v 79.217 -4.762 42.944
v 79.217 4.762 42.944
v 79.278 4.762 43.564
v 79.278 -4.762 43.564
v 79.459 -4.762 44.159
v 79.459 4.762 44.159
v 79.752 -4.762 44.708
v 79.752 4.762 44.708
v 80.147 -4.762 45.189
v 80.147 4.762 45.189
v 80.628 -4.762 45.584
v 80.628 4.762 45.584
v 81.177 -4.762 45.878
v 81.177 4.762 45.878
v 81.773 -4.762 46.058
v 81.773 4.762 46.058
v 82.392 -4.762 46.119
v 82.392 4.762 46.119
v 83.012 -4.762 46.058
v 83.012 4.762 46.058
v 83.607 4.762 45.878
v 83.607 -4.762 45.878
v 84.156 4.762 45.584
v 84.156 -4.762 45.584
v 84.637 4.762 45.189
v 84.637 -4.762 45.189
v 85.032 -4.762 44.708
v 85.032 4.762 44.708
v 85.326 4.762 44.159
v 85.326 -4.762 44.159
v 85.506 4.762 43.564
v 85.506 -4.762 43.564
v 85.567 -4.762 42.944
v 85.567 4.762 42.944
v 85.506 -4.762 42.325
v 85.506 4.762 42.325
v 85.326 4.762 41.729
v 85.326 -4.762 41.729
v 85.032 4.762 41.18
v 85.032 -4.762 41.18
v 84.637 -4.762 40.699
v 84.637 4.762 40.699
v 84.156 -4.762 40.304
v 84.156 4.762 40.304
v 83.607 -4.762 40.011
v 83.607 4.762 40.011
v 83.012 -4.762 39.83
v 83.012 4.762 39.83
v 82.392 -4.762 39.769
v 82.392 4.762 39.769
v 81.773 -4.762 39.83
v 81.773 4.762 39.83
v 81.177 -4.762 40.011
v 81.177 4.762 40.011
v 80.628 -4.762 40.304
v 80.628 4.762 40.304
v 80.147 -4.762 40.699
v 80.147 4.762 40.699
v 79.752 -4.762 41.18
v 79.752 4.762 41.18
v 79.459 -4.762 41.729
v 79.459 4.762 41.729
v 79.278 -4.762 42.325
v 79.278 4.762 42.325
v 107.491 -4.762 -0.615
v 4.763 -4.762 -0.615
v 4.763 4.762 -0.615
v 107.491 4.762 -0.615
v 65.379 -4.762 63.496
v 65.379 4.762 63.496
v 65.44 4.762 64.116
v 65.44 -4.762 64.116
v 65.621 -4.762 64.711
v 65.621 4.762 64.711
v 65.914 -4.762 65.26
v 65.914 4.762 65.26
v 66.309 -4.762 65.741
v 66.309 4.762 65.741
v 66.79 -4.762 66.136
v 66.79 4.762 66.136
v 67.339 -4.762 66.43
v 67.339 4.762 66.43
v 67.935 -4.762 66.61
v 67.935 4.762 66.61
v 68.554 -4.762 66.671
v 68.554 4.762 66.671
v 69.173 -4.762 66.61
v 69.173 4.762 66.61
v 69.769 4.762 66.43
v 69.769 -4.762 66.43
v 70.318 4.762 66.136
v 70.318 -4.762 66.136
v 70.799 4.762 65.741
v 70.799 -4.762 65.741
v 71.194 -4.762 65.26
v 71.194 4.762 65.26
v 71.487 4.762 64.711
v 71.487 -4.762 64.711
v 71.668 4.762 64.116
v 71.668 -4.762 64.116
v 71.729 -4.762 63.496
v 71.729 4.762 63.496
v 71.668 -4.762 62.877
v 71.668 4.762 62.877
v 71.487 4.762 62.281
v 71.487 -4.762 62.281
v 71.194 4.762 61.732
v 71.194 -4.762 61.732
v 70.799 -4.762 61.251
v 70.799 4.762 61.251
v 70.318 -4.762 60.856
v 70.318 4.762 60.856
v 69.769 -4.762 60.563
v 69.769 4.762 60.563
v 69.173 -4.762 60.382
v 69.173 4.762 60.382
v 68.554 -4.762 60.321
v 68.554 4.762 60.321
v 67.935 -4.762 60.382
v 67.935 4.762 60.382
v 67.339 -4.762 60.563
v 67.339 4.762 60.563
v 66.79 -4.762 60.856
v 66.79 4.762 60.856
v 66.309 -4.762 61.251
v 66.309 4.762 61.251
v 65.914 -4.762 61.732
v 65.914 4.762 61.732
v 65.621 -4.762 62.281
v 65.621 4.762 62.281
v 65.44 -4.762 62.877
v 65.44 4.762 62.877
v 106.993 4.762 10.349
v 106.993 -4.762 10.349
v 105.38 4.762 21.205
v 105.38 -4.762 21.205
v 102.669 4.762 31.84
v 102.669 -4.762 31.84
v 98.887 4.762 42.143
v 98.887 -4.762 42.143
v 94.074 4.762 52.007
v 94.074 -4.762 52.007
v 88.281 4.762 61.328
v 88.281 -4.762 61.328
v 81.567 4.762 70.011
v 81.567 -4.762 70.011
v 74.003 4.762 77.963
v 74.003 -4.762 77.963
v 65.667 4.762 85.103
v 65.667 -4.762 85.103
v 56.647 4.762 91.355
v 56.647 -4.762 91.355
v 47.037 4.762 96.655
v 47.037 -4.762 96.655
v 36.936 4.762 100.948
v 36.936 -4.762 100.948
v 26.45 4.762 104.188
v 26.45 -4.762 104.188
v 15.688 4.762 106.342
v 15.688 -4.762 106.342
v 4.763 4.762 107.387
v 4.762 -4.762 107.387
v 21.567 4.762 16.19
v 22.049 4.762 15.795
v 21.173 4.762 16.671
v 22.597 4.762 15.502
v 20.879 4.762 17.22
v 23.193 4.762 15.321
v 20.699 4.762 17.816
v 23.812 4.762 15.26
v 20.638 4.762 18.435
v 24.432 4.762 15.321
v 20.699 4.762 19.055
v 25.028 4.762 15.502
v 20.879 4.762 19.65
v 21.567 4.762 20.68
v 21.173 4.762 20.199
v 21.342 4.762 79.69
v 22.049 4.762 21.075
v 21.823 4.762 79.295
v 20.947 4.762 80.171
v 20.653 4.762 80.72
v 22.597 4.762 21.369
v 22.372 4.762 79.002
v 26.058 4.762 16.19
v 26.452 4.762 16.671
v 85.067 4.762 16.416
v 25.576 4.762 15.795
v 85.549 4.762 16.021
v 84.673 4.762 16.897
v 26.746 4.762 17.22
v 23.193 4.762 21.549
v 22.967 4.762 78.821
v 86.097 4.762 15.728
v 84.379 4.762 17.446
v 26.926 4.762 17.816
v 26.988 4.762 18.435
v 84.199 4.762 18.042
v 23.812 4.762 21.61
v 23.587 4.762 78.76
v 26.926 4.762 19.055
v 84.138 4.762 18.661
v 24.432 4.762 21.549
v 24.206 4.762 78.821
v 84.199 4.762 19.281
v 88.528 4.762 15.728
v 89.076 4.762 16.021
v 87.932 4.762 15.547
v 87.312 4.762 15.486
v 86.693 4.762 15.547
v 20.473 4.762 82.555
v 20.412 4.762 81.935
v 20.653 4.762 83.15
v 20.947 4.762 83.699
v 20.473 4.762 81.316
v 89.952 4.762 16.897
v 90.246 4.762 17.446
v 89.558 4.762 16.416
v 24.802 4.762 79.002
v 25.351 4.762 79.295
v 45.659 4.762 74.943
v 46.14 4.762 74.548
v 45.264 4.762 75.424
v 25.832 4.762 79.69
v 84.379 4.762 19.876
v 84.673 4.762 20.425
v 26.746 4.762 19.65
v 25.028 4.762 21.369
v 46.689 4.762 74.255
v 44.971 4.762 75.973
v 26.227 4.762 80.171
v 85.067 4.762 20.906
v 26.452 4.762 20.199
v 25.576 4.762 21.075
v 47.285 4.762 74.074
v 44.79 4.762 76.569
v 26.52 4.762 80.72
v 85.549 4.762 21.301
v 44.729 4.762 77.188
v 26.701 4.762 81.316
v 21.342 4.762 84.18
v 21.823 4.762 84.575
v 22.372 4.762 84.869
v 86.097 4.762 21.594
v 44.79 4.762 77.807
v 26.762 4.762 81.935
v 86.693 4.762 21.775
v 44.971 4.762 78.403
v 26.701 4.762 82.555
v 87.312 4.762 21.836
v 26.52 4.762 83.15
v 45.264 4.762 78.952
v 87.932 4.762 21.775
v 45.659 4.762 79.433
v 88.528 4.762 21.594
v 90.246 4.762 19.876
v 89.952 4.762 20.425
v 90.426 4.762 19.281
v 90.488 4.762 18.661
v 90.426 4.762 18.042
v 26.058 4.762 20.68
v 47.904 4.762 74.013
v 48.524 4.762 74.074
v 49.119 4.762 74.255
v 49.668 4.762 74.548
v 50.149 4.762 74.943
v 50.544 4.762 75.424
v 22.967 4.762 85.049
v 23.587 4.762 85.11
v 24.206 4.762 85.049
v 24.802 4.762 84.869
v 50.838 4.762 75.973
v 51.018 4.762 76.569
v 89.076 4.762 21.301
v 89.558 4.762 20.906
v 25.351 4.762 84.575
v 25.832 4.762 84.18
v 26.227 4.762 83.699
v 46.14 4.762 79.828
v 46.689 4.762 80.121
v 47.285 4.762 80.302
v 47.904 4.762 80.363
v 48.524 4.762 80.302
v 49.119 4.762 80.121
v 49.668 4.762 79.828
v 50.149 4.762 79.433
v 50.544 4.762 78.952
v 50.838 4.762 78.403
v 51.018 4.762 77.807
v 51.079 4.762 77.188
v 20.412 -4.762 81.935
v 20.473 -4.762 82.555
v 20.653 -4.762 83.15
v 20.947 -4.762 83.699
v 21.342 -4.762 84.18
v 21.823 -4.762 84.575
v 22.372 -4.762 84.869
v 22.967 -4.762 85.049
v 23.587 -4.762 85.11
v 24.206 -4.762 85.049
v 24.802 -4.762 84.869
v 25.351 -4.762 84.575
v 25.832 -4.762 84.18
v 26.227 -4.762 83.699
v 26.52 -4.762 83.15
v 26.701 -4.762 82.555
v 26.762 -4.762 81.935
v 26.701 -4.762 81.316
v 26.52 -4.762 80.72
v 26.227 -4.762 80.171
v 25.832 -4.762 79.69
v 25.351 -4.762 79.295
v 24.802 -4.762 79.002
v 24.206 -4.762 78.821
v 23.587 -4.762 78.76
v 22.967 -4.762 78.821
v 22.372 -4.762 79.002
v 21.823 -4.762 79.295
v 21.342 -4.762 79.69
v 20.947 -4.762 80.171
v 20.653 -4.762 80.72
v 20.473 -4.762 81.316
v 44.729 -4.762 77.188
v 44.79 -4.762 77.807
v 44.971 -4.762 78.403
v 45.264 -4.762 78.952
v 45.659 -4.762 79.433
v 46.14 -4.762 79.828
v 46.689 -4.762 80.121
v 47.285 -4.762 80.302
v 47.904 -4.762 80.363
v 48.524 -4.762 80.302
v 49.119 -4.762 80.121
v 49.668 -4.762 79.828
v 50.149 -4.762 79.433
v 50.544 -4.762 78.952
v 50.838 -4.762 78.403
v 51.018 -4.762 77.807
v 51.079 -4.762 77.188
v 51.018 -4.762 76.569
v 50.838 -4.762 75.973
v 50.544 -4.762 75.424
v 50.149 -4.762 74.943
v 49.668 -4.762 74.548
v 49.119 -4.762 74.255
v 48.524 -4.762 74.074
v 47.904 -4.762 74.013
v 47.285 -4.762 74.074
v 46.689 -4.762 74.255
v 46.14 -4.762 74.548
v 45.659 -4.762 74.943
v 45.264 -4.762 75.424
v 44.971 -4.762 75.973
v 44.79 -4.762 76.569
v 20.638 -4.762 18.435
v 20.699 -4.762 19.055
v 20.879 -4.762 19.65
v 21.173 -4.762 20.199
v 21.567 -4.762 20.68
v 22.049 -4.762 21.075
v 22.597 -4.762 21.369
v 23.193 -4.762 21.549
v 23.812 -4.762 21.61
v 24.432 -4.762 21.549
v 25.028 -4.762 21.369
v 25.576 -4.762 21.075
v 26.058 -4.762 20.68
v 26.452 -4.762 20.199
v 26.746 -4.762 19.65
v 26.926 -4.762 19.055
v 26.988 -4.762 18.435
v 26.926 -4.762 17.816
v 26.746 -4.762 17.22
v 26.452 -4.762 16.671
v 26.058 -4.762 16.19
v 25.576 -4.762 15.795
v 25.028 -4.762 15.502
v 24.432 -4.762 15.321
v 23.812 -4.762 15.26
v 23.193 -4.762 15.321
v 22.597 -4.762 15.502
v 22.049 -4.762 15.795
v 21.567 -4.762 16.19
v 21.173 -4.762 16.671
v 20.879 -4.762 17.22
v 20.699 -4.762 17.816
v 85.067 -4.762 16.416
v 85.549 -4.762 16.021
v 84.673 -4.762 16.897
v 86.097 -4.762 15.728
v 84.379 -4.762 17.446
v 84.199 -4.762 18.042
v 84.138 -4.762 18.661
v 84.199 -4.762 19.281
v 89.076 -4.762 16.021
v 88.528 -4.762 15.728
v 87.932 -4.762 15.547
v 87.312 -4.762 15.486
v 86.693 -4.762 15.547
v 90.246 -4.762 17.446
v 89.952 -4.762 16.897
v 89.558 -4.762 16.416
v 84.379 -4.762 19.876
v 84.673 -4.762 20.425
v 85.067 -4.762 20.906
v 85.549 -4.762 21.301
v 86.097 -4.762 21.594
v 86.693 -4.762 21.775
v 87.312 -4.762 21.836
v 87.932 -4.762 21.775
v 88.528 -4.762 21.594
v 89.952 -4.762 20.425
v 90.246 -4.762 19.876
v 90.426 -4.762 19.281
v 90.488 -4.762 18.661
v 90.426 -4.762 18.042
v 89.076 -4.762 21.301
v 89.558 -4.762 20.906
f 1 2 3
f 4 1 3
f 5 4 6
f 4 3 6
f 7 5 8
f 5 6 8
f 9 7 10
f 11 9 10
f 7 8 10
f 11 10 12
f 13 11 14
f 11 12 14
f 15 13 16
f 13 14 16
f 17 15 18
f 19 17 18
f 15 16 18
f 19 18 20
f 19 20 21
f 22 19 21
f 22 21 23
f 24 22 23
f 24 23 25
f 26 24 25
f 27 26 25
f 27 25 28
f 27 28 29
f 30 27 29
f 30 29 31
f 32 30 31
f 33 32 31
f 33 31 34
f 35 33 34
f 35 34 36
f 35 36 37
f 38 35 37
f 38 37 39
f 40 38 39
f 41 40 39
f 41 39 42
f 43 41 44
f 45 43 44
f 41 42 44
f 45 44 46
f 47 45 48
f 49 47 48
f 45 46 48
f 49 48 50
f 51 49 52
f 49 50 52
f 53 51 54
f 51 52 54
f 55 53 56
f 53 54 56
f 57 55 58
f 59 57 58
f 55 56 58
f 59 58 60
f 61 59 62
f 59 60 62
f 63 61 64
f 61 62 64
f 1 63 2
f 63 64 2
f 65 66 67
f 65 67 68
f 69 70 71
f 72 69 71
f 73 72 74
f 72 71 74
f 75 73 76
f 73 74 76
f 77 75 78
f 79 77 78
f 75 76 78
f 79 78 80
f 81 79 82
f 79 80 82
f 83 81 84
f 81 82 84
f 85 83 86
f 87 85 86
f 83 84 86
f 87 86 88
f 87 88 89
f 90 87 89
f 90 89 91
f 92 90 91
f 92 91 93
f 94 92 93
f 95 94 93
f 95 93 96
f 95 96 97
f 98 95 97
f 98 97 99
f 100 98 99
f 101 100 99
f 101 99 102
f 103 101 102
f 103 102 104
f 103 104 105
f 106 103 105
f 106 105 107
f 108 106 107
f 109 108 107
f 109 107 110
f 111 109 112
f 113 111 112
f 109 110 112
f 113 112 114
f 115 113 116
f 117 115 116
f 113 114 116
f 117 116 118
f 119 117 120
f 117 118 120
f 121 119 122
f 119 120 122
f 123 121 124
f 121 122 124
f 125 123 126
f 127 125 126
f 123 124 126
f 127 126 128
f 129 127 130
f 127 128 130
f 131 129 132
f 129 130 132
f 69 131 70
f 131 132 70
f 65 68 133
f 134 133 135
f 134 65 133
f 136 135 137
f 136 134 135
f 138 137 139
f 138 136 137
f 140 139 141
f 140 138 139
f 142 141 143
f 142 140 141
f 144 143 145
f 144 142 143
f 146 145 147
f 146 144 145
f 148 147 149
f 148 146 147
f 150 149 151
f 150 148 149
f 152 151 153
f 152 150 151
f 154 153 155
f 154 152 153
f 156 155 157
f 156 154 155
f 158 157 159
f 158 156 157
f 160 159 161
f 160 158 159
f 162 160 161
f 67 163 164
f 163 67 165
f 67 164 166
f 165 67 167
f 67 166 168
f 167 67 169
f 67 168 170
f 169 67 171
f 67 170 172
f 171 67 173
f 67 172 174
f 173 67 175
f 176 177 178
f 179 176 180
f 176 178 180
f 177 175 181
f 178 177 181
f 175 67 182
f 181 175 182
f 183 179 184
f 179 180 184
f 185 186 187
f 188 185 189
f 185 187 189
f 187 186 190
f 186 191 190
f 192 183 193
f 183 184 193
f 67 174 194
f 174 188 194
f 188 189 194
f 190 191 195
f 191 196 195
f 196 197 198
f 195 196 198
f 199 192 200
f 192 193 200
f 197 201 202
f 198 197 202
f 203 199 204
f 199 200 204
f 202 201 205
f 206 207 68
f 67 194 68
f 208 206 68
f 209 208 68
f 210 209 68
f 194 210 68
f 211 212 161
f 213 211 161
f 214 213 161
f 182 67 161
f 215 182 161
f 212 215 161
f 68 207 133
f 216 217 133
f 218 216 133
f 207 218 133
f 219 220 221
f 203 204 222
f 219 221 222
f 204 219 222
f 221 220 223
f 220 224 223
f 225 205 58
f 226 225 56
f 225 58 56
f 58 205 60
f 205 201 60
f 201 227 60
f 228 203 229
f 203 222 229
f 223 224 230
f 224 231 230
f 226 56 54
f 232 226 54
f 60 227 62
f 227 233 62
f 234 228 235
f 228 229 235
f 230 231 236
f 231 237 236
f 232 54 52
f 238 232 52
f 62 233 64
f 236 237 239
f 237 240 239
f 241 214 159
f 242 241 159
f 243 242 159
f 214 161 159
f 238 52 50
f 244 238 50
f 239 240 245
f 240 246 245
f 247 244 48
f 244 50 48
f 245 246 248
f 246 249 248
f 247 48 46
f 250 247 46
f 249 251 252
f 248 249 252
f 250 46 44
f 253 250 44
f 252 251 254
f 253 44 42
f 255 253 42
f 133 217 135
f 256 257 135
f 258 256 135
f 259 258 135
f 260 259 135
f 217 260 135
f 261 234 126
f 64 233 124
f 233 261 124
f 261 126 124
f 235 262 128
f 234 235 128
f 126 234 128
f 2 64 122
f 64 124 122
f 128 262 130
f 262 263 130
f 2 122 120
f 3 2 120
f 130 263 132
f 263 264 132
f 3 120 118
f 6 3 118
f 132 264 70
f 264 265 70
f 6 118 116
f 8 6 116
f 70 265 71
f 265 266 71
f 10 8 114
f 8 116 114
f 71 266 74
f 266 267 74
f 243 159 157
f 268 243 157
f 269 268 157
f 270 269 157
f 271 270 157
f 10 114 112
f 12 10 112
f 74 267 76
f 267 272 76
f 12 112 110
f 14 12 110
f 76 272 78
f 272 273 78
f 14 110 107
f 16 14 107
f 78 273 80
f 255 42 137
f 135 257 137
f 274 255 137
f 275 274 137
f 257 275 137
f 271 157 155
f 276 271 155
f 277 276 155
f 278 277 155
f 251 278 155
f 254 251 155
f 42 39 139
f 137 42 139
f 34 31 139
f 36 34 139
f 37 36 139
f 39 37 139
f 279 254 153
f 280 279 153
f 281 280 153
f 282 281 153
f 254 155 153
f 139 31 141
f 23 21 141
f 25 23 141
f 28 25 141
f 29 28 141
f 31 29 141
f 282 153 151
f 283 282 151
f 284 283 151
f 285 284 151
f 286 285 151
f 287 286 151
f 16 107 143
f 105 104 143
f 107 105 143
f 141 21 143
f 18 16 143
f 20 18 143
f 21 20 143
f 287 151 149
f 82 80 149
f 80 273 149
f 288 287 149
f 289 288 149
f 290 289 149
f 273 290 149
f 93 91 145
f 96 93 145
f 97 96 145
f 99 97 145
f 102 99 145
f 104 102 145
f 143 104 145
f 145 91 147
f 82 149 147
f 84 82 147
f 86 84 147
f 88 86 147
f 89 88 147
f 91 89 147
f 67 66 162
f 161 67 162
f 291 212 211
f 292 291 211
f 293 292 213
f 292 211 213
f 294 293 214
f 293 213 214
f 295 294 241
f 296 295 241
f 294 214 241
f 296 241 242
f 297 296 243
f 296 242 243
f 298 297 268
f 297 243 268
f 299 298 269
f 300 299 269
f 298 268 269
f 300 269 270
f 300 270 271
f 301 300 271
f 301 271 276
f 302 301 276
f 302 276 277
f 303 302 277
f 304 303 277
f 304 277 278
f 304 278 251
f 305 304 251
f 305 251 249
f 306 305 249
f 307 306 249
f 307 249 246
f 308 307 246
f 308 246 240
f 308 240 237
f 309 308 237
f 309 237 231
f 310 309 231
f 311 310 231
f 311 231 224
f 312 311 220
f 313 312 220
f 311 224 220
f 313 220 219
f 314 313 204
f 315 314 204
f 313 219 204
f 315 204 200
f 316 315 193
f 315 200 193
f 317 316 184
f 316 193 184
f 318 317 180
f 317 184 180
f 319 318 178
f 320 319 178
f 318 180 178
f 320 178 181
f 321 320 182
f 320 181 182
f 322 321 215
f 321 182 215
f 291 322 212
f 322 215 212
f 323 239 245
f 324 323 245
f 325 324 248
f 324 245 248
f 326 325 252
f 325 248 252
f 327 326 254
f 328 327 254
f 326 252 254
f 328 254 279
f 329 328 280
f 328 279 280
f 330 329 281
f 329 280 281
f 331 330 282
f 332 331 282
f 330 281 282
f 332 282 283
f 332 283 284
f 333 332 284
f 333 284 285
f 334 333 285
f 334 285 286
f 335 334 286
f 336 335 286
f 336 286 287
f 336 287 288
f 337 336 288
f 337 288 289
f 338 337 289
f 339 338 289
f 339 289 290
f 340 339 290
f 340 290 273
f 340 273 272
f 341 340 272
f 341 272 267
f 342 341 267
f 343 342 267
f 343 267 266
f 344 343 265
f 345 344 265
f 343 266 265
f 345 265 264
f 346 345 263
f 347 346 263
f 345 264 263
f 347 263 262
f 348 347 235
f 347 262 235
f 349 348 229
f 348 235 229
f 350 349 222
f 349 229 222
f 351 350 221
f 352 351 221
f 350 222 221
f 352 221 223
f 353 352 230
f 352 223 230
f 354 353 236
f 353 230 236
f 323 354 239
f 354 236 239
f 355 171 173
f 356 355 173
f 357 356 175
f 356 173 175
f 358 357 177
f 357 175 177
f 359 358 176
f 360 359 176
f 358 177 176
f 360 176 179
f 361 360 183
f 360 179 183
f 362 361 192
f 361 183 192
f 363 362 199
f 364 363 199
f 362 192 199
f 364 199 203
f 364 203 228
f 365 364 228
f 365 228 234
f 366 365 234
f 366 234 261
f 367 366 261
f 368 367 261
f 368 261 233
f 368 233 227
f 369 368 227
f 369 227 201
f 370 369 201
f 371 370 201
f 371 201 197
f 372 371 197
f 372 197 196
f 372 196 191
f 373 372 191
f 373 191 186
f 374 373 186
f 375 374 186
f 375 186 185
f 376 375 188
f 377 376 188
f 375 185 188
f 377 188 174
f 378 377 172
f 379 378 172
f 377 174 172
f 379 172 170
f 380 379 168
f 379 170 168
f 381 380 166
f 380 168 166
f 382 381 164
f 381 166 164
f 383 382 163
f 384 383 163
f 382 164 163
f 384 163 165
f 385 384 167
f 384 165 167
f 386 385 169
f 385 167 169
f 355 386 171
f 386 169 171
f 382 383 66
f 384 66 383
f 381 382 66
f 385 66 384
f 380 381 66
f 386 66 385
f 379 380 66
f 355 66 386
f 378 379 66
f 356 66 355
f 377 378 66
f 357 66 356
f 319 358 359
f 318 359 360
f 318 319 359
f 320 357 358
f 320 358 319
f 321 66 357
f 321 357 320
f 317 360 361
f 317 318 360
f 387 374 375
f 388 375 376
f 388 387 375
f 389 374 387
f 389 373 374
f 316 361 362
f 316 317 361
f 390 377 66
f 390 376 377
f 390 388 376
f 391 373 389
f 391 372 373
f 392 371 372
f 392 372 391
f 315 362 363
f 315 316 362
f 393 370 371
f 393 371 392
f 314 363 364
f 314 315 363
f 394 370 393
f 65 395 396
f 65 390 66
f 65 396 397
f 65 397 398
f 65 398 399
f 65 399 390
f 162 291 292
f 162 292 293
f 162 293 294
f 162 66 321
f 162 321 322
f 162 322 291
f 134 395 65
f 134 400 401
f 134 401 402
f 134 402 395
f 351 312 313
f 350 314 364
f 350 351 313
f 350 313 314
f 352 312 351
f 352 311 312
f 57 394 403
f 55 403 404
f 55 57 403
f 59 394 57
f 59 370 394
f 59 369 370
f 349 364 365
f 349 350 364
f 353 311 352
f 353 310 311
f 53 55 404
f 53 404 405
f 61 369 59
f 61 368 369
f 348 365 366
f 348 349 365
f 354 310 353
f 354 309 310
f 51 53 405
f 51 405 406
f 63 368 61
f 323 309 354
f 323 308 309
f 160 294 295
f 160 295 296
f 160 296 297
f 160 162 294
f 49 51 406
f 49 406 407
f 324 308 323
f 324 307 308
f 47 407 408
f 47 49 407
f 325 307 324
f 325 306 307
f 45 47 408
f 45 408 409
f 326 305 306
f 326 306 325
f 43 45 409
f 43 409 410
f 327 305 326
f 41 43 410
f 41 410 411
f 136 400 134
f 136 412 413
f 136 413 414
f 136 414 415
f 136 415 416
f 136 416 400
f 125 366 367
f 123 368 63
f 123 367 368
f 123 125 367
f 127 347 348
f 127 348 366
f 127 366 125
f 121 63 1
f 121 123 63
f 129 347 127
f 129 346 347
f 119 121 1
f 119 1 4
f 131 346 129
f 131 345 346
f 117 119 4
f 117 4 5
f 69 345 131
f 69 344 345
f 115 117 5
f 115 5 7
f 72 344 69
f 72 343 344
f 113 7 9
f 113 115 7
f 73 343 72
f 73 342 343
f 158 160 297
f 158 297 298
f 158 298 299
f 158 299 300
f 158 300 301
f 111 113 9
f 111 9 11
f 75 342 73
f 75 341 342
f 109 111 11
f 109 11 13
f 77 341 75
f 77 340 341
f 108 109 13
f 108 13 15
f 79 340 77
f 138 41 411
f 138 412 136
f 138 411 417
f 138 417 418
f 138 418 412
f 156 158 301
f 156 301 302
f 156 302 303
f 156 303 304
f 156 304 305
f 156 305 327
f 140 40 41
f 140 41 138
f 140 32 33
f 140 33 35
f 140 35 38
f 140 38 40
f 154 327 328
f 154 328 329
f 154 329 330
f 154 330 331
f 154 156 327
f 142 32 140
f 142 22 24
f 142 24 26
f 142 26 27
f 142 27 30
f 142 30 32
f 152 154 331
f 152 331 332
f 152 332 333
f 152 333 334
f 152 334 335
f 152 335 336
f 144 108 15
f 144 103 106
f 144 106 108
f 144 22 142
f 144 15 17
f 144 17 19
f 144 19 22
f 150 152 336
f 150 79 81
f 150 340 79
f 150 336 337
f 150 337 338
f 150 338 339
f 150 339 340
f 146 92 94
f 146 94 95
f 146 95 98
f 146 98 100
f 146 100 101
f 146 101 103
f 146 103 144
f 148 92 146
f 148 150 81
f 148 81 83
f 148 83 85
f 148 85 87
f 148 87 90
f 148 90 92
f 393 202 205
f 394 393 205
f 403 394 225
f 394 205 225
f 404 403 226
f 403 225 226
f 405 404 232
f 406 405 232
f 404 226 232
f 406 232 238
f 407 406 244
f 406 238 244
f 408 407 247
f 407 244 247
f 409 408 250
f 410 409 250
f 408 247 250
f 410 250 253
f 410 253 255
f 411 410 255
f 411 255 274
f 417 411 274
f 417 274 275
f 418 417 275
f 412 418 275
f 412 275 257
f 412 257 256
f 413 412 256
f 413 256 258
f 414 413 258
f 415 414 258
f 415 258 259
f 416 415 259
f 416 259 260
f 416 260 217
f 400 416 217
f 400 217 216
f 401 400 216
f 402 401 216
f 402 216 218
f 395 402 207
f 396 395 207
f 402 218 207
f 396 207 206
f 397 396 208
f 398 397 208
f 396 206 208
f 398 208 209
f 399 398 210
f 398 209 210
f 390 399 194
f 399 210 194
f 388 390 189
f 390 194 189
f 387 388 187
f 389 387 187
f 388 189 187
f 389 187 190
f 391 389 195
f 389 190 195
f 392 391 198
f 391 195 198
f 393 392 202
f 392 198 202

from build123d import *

# Parameters (mm, degrees)
F1_DEPTH = 4.7625
F3_D     = 6.35
F4_R     = 3.175
F5_DEPTH = 25.4


with BuildPart() as f1:
    # F0 (on Front) → F1 (new body, symmetric)
    with BuildSketch(Plane.XZ):
        with BuildLine():
            ThreePointArc((107.4907893633, -0.6147240541), (0, 107.4925471073), (-107.4907893633, -0.6147240541))
            Line((-107.4907893633, -0.6147240541), (107.4907893633, -0.6147240541))
        make_face()
    extrude(amount=F1_DEPTH, both=True)

    # F3 (through all)
    with Locations(Plane.XZ.offset(4.7625)):
        with Locations((23.8125, 18.4352759459), (87.3125, 18.6611738243), (47.9041955289, 77.1880736359), (23.5866021216, 81.9352759459), (68.5540466837, 63.4962904729), (82.392402939, 42.9443763274), (-23.8125, 18.4352759459), (-23.5866021216, 81.9352759459), (-47.9041955289, 77.1880736359), (-68.5540466837, 63.4962904729), (-82.392402939, 42.9443763274), (-87.3125, 18.6611738243)):
            Hole(F3_D / 2)

    # F4 (on face) → F5 (cut)
    with BuildSketch(Plane.XZ.offset(4.7625)):
        with BuildLine():
            Line((-135.8842252305, -8.5859880761), (4.7625, -8.5859880761))
            Line((4.7625, -8.5859880761), (4.7625, -0.6147240541))
            Line((4.7625, -0.6147240541), (-107.4907893633, -0.6147240541))
            ThreePointArc((-107.4907893633, -0.6147240541), (-74.5276330195, 77.4614717141), (4.7625, 107.3869930548))
            Line((4.7625, 107.3869930548), (4.7625, 118.4140119239))
            Line((4.7625, 118.4140119239), (-135.8842252305, 118.4140119239))
            Line((-135.8842252305, 118.4140119239), (-135.8842252305, -8.5859880761))
        make_face()
        with BuildLine():
            Line((-107.4907893633, -0.6147240541), (4.7625, -0.6147240541))
            Line((4.7625, -0.6147240541), (4.7625, 107.3869930548))
            ThreePointArc((4.7625, 107.3869930548), (-74.5276330195, 77.4614717141), (-107.4907893633, -0.6147240541))
        make_face()
        with Locations((-87.3125, 18.6611738243)):
            Circle(F4_R, mode=Mode.SUBTRACT)
        with Locations((-23.8125, 18.4352759459)):
            Circle(F4_R, mode=Mode.SUBTRACT)
        with Locations((-82.392402939, 42.9443763274)):
            Circle(F4_R, mode=Mode.SUBTRACT)
        with Locations((-68.5540466837, 63.4962904729)):
            Circle(F4_R, mode=Mode.SUBTRACT)
        with Locations((-47.9041955289, 77.1880736359)):
            Circle(F4_R, mode=Mode.SUBTRACT)
        with Locations((-23.5866021216, 81.9352759459)):
            Circle(F4_R, mode=Mode.SUBTRACT)
    extrude(amount=-F5_DEPTH, mode=Mode.SUBTRACT)


solid = f1.part
